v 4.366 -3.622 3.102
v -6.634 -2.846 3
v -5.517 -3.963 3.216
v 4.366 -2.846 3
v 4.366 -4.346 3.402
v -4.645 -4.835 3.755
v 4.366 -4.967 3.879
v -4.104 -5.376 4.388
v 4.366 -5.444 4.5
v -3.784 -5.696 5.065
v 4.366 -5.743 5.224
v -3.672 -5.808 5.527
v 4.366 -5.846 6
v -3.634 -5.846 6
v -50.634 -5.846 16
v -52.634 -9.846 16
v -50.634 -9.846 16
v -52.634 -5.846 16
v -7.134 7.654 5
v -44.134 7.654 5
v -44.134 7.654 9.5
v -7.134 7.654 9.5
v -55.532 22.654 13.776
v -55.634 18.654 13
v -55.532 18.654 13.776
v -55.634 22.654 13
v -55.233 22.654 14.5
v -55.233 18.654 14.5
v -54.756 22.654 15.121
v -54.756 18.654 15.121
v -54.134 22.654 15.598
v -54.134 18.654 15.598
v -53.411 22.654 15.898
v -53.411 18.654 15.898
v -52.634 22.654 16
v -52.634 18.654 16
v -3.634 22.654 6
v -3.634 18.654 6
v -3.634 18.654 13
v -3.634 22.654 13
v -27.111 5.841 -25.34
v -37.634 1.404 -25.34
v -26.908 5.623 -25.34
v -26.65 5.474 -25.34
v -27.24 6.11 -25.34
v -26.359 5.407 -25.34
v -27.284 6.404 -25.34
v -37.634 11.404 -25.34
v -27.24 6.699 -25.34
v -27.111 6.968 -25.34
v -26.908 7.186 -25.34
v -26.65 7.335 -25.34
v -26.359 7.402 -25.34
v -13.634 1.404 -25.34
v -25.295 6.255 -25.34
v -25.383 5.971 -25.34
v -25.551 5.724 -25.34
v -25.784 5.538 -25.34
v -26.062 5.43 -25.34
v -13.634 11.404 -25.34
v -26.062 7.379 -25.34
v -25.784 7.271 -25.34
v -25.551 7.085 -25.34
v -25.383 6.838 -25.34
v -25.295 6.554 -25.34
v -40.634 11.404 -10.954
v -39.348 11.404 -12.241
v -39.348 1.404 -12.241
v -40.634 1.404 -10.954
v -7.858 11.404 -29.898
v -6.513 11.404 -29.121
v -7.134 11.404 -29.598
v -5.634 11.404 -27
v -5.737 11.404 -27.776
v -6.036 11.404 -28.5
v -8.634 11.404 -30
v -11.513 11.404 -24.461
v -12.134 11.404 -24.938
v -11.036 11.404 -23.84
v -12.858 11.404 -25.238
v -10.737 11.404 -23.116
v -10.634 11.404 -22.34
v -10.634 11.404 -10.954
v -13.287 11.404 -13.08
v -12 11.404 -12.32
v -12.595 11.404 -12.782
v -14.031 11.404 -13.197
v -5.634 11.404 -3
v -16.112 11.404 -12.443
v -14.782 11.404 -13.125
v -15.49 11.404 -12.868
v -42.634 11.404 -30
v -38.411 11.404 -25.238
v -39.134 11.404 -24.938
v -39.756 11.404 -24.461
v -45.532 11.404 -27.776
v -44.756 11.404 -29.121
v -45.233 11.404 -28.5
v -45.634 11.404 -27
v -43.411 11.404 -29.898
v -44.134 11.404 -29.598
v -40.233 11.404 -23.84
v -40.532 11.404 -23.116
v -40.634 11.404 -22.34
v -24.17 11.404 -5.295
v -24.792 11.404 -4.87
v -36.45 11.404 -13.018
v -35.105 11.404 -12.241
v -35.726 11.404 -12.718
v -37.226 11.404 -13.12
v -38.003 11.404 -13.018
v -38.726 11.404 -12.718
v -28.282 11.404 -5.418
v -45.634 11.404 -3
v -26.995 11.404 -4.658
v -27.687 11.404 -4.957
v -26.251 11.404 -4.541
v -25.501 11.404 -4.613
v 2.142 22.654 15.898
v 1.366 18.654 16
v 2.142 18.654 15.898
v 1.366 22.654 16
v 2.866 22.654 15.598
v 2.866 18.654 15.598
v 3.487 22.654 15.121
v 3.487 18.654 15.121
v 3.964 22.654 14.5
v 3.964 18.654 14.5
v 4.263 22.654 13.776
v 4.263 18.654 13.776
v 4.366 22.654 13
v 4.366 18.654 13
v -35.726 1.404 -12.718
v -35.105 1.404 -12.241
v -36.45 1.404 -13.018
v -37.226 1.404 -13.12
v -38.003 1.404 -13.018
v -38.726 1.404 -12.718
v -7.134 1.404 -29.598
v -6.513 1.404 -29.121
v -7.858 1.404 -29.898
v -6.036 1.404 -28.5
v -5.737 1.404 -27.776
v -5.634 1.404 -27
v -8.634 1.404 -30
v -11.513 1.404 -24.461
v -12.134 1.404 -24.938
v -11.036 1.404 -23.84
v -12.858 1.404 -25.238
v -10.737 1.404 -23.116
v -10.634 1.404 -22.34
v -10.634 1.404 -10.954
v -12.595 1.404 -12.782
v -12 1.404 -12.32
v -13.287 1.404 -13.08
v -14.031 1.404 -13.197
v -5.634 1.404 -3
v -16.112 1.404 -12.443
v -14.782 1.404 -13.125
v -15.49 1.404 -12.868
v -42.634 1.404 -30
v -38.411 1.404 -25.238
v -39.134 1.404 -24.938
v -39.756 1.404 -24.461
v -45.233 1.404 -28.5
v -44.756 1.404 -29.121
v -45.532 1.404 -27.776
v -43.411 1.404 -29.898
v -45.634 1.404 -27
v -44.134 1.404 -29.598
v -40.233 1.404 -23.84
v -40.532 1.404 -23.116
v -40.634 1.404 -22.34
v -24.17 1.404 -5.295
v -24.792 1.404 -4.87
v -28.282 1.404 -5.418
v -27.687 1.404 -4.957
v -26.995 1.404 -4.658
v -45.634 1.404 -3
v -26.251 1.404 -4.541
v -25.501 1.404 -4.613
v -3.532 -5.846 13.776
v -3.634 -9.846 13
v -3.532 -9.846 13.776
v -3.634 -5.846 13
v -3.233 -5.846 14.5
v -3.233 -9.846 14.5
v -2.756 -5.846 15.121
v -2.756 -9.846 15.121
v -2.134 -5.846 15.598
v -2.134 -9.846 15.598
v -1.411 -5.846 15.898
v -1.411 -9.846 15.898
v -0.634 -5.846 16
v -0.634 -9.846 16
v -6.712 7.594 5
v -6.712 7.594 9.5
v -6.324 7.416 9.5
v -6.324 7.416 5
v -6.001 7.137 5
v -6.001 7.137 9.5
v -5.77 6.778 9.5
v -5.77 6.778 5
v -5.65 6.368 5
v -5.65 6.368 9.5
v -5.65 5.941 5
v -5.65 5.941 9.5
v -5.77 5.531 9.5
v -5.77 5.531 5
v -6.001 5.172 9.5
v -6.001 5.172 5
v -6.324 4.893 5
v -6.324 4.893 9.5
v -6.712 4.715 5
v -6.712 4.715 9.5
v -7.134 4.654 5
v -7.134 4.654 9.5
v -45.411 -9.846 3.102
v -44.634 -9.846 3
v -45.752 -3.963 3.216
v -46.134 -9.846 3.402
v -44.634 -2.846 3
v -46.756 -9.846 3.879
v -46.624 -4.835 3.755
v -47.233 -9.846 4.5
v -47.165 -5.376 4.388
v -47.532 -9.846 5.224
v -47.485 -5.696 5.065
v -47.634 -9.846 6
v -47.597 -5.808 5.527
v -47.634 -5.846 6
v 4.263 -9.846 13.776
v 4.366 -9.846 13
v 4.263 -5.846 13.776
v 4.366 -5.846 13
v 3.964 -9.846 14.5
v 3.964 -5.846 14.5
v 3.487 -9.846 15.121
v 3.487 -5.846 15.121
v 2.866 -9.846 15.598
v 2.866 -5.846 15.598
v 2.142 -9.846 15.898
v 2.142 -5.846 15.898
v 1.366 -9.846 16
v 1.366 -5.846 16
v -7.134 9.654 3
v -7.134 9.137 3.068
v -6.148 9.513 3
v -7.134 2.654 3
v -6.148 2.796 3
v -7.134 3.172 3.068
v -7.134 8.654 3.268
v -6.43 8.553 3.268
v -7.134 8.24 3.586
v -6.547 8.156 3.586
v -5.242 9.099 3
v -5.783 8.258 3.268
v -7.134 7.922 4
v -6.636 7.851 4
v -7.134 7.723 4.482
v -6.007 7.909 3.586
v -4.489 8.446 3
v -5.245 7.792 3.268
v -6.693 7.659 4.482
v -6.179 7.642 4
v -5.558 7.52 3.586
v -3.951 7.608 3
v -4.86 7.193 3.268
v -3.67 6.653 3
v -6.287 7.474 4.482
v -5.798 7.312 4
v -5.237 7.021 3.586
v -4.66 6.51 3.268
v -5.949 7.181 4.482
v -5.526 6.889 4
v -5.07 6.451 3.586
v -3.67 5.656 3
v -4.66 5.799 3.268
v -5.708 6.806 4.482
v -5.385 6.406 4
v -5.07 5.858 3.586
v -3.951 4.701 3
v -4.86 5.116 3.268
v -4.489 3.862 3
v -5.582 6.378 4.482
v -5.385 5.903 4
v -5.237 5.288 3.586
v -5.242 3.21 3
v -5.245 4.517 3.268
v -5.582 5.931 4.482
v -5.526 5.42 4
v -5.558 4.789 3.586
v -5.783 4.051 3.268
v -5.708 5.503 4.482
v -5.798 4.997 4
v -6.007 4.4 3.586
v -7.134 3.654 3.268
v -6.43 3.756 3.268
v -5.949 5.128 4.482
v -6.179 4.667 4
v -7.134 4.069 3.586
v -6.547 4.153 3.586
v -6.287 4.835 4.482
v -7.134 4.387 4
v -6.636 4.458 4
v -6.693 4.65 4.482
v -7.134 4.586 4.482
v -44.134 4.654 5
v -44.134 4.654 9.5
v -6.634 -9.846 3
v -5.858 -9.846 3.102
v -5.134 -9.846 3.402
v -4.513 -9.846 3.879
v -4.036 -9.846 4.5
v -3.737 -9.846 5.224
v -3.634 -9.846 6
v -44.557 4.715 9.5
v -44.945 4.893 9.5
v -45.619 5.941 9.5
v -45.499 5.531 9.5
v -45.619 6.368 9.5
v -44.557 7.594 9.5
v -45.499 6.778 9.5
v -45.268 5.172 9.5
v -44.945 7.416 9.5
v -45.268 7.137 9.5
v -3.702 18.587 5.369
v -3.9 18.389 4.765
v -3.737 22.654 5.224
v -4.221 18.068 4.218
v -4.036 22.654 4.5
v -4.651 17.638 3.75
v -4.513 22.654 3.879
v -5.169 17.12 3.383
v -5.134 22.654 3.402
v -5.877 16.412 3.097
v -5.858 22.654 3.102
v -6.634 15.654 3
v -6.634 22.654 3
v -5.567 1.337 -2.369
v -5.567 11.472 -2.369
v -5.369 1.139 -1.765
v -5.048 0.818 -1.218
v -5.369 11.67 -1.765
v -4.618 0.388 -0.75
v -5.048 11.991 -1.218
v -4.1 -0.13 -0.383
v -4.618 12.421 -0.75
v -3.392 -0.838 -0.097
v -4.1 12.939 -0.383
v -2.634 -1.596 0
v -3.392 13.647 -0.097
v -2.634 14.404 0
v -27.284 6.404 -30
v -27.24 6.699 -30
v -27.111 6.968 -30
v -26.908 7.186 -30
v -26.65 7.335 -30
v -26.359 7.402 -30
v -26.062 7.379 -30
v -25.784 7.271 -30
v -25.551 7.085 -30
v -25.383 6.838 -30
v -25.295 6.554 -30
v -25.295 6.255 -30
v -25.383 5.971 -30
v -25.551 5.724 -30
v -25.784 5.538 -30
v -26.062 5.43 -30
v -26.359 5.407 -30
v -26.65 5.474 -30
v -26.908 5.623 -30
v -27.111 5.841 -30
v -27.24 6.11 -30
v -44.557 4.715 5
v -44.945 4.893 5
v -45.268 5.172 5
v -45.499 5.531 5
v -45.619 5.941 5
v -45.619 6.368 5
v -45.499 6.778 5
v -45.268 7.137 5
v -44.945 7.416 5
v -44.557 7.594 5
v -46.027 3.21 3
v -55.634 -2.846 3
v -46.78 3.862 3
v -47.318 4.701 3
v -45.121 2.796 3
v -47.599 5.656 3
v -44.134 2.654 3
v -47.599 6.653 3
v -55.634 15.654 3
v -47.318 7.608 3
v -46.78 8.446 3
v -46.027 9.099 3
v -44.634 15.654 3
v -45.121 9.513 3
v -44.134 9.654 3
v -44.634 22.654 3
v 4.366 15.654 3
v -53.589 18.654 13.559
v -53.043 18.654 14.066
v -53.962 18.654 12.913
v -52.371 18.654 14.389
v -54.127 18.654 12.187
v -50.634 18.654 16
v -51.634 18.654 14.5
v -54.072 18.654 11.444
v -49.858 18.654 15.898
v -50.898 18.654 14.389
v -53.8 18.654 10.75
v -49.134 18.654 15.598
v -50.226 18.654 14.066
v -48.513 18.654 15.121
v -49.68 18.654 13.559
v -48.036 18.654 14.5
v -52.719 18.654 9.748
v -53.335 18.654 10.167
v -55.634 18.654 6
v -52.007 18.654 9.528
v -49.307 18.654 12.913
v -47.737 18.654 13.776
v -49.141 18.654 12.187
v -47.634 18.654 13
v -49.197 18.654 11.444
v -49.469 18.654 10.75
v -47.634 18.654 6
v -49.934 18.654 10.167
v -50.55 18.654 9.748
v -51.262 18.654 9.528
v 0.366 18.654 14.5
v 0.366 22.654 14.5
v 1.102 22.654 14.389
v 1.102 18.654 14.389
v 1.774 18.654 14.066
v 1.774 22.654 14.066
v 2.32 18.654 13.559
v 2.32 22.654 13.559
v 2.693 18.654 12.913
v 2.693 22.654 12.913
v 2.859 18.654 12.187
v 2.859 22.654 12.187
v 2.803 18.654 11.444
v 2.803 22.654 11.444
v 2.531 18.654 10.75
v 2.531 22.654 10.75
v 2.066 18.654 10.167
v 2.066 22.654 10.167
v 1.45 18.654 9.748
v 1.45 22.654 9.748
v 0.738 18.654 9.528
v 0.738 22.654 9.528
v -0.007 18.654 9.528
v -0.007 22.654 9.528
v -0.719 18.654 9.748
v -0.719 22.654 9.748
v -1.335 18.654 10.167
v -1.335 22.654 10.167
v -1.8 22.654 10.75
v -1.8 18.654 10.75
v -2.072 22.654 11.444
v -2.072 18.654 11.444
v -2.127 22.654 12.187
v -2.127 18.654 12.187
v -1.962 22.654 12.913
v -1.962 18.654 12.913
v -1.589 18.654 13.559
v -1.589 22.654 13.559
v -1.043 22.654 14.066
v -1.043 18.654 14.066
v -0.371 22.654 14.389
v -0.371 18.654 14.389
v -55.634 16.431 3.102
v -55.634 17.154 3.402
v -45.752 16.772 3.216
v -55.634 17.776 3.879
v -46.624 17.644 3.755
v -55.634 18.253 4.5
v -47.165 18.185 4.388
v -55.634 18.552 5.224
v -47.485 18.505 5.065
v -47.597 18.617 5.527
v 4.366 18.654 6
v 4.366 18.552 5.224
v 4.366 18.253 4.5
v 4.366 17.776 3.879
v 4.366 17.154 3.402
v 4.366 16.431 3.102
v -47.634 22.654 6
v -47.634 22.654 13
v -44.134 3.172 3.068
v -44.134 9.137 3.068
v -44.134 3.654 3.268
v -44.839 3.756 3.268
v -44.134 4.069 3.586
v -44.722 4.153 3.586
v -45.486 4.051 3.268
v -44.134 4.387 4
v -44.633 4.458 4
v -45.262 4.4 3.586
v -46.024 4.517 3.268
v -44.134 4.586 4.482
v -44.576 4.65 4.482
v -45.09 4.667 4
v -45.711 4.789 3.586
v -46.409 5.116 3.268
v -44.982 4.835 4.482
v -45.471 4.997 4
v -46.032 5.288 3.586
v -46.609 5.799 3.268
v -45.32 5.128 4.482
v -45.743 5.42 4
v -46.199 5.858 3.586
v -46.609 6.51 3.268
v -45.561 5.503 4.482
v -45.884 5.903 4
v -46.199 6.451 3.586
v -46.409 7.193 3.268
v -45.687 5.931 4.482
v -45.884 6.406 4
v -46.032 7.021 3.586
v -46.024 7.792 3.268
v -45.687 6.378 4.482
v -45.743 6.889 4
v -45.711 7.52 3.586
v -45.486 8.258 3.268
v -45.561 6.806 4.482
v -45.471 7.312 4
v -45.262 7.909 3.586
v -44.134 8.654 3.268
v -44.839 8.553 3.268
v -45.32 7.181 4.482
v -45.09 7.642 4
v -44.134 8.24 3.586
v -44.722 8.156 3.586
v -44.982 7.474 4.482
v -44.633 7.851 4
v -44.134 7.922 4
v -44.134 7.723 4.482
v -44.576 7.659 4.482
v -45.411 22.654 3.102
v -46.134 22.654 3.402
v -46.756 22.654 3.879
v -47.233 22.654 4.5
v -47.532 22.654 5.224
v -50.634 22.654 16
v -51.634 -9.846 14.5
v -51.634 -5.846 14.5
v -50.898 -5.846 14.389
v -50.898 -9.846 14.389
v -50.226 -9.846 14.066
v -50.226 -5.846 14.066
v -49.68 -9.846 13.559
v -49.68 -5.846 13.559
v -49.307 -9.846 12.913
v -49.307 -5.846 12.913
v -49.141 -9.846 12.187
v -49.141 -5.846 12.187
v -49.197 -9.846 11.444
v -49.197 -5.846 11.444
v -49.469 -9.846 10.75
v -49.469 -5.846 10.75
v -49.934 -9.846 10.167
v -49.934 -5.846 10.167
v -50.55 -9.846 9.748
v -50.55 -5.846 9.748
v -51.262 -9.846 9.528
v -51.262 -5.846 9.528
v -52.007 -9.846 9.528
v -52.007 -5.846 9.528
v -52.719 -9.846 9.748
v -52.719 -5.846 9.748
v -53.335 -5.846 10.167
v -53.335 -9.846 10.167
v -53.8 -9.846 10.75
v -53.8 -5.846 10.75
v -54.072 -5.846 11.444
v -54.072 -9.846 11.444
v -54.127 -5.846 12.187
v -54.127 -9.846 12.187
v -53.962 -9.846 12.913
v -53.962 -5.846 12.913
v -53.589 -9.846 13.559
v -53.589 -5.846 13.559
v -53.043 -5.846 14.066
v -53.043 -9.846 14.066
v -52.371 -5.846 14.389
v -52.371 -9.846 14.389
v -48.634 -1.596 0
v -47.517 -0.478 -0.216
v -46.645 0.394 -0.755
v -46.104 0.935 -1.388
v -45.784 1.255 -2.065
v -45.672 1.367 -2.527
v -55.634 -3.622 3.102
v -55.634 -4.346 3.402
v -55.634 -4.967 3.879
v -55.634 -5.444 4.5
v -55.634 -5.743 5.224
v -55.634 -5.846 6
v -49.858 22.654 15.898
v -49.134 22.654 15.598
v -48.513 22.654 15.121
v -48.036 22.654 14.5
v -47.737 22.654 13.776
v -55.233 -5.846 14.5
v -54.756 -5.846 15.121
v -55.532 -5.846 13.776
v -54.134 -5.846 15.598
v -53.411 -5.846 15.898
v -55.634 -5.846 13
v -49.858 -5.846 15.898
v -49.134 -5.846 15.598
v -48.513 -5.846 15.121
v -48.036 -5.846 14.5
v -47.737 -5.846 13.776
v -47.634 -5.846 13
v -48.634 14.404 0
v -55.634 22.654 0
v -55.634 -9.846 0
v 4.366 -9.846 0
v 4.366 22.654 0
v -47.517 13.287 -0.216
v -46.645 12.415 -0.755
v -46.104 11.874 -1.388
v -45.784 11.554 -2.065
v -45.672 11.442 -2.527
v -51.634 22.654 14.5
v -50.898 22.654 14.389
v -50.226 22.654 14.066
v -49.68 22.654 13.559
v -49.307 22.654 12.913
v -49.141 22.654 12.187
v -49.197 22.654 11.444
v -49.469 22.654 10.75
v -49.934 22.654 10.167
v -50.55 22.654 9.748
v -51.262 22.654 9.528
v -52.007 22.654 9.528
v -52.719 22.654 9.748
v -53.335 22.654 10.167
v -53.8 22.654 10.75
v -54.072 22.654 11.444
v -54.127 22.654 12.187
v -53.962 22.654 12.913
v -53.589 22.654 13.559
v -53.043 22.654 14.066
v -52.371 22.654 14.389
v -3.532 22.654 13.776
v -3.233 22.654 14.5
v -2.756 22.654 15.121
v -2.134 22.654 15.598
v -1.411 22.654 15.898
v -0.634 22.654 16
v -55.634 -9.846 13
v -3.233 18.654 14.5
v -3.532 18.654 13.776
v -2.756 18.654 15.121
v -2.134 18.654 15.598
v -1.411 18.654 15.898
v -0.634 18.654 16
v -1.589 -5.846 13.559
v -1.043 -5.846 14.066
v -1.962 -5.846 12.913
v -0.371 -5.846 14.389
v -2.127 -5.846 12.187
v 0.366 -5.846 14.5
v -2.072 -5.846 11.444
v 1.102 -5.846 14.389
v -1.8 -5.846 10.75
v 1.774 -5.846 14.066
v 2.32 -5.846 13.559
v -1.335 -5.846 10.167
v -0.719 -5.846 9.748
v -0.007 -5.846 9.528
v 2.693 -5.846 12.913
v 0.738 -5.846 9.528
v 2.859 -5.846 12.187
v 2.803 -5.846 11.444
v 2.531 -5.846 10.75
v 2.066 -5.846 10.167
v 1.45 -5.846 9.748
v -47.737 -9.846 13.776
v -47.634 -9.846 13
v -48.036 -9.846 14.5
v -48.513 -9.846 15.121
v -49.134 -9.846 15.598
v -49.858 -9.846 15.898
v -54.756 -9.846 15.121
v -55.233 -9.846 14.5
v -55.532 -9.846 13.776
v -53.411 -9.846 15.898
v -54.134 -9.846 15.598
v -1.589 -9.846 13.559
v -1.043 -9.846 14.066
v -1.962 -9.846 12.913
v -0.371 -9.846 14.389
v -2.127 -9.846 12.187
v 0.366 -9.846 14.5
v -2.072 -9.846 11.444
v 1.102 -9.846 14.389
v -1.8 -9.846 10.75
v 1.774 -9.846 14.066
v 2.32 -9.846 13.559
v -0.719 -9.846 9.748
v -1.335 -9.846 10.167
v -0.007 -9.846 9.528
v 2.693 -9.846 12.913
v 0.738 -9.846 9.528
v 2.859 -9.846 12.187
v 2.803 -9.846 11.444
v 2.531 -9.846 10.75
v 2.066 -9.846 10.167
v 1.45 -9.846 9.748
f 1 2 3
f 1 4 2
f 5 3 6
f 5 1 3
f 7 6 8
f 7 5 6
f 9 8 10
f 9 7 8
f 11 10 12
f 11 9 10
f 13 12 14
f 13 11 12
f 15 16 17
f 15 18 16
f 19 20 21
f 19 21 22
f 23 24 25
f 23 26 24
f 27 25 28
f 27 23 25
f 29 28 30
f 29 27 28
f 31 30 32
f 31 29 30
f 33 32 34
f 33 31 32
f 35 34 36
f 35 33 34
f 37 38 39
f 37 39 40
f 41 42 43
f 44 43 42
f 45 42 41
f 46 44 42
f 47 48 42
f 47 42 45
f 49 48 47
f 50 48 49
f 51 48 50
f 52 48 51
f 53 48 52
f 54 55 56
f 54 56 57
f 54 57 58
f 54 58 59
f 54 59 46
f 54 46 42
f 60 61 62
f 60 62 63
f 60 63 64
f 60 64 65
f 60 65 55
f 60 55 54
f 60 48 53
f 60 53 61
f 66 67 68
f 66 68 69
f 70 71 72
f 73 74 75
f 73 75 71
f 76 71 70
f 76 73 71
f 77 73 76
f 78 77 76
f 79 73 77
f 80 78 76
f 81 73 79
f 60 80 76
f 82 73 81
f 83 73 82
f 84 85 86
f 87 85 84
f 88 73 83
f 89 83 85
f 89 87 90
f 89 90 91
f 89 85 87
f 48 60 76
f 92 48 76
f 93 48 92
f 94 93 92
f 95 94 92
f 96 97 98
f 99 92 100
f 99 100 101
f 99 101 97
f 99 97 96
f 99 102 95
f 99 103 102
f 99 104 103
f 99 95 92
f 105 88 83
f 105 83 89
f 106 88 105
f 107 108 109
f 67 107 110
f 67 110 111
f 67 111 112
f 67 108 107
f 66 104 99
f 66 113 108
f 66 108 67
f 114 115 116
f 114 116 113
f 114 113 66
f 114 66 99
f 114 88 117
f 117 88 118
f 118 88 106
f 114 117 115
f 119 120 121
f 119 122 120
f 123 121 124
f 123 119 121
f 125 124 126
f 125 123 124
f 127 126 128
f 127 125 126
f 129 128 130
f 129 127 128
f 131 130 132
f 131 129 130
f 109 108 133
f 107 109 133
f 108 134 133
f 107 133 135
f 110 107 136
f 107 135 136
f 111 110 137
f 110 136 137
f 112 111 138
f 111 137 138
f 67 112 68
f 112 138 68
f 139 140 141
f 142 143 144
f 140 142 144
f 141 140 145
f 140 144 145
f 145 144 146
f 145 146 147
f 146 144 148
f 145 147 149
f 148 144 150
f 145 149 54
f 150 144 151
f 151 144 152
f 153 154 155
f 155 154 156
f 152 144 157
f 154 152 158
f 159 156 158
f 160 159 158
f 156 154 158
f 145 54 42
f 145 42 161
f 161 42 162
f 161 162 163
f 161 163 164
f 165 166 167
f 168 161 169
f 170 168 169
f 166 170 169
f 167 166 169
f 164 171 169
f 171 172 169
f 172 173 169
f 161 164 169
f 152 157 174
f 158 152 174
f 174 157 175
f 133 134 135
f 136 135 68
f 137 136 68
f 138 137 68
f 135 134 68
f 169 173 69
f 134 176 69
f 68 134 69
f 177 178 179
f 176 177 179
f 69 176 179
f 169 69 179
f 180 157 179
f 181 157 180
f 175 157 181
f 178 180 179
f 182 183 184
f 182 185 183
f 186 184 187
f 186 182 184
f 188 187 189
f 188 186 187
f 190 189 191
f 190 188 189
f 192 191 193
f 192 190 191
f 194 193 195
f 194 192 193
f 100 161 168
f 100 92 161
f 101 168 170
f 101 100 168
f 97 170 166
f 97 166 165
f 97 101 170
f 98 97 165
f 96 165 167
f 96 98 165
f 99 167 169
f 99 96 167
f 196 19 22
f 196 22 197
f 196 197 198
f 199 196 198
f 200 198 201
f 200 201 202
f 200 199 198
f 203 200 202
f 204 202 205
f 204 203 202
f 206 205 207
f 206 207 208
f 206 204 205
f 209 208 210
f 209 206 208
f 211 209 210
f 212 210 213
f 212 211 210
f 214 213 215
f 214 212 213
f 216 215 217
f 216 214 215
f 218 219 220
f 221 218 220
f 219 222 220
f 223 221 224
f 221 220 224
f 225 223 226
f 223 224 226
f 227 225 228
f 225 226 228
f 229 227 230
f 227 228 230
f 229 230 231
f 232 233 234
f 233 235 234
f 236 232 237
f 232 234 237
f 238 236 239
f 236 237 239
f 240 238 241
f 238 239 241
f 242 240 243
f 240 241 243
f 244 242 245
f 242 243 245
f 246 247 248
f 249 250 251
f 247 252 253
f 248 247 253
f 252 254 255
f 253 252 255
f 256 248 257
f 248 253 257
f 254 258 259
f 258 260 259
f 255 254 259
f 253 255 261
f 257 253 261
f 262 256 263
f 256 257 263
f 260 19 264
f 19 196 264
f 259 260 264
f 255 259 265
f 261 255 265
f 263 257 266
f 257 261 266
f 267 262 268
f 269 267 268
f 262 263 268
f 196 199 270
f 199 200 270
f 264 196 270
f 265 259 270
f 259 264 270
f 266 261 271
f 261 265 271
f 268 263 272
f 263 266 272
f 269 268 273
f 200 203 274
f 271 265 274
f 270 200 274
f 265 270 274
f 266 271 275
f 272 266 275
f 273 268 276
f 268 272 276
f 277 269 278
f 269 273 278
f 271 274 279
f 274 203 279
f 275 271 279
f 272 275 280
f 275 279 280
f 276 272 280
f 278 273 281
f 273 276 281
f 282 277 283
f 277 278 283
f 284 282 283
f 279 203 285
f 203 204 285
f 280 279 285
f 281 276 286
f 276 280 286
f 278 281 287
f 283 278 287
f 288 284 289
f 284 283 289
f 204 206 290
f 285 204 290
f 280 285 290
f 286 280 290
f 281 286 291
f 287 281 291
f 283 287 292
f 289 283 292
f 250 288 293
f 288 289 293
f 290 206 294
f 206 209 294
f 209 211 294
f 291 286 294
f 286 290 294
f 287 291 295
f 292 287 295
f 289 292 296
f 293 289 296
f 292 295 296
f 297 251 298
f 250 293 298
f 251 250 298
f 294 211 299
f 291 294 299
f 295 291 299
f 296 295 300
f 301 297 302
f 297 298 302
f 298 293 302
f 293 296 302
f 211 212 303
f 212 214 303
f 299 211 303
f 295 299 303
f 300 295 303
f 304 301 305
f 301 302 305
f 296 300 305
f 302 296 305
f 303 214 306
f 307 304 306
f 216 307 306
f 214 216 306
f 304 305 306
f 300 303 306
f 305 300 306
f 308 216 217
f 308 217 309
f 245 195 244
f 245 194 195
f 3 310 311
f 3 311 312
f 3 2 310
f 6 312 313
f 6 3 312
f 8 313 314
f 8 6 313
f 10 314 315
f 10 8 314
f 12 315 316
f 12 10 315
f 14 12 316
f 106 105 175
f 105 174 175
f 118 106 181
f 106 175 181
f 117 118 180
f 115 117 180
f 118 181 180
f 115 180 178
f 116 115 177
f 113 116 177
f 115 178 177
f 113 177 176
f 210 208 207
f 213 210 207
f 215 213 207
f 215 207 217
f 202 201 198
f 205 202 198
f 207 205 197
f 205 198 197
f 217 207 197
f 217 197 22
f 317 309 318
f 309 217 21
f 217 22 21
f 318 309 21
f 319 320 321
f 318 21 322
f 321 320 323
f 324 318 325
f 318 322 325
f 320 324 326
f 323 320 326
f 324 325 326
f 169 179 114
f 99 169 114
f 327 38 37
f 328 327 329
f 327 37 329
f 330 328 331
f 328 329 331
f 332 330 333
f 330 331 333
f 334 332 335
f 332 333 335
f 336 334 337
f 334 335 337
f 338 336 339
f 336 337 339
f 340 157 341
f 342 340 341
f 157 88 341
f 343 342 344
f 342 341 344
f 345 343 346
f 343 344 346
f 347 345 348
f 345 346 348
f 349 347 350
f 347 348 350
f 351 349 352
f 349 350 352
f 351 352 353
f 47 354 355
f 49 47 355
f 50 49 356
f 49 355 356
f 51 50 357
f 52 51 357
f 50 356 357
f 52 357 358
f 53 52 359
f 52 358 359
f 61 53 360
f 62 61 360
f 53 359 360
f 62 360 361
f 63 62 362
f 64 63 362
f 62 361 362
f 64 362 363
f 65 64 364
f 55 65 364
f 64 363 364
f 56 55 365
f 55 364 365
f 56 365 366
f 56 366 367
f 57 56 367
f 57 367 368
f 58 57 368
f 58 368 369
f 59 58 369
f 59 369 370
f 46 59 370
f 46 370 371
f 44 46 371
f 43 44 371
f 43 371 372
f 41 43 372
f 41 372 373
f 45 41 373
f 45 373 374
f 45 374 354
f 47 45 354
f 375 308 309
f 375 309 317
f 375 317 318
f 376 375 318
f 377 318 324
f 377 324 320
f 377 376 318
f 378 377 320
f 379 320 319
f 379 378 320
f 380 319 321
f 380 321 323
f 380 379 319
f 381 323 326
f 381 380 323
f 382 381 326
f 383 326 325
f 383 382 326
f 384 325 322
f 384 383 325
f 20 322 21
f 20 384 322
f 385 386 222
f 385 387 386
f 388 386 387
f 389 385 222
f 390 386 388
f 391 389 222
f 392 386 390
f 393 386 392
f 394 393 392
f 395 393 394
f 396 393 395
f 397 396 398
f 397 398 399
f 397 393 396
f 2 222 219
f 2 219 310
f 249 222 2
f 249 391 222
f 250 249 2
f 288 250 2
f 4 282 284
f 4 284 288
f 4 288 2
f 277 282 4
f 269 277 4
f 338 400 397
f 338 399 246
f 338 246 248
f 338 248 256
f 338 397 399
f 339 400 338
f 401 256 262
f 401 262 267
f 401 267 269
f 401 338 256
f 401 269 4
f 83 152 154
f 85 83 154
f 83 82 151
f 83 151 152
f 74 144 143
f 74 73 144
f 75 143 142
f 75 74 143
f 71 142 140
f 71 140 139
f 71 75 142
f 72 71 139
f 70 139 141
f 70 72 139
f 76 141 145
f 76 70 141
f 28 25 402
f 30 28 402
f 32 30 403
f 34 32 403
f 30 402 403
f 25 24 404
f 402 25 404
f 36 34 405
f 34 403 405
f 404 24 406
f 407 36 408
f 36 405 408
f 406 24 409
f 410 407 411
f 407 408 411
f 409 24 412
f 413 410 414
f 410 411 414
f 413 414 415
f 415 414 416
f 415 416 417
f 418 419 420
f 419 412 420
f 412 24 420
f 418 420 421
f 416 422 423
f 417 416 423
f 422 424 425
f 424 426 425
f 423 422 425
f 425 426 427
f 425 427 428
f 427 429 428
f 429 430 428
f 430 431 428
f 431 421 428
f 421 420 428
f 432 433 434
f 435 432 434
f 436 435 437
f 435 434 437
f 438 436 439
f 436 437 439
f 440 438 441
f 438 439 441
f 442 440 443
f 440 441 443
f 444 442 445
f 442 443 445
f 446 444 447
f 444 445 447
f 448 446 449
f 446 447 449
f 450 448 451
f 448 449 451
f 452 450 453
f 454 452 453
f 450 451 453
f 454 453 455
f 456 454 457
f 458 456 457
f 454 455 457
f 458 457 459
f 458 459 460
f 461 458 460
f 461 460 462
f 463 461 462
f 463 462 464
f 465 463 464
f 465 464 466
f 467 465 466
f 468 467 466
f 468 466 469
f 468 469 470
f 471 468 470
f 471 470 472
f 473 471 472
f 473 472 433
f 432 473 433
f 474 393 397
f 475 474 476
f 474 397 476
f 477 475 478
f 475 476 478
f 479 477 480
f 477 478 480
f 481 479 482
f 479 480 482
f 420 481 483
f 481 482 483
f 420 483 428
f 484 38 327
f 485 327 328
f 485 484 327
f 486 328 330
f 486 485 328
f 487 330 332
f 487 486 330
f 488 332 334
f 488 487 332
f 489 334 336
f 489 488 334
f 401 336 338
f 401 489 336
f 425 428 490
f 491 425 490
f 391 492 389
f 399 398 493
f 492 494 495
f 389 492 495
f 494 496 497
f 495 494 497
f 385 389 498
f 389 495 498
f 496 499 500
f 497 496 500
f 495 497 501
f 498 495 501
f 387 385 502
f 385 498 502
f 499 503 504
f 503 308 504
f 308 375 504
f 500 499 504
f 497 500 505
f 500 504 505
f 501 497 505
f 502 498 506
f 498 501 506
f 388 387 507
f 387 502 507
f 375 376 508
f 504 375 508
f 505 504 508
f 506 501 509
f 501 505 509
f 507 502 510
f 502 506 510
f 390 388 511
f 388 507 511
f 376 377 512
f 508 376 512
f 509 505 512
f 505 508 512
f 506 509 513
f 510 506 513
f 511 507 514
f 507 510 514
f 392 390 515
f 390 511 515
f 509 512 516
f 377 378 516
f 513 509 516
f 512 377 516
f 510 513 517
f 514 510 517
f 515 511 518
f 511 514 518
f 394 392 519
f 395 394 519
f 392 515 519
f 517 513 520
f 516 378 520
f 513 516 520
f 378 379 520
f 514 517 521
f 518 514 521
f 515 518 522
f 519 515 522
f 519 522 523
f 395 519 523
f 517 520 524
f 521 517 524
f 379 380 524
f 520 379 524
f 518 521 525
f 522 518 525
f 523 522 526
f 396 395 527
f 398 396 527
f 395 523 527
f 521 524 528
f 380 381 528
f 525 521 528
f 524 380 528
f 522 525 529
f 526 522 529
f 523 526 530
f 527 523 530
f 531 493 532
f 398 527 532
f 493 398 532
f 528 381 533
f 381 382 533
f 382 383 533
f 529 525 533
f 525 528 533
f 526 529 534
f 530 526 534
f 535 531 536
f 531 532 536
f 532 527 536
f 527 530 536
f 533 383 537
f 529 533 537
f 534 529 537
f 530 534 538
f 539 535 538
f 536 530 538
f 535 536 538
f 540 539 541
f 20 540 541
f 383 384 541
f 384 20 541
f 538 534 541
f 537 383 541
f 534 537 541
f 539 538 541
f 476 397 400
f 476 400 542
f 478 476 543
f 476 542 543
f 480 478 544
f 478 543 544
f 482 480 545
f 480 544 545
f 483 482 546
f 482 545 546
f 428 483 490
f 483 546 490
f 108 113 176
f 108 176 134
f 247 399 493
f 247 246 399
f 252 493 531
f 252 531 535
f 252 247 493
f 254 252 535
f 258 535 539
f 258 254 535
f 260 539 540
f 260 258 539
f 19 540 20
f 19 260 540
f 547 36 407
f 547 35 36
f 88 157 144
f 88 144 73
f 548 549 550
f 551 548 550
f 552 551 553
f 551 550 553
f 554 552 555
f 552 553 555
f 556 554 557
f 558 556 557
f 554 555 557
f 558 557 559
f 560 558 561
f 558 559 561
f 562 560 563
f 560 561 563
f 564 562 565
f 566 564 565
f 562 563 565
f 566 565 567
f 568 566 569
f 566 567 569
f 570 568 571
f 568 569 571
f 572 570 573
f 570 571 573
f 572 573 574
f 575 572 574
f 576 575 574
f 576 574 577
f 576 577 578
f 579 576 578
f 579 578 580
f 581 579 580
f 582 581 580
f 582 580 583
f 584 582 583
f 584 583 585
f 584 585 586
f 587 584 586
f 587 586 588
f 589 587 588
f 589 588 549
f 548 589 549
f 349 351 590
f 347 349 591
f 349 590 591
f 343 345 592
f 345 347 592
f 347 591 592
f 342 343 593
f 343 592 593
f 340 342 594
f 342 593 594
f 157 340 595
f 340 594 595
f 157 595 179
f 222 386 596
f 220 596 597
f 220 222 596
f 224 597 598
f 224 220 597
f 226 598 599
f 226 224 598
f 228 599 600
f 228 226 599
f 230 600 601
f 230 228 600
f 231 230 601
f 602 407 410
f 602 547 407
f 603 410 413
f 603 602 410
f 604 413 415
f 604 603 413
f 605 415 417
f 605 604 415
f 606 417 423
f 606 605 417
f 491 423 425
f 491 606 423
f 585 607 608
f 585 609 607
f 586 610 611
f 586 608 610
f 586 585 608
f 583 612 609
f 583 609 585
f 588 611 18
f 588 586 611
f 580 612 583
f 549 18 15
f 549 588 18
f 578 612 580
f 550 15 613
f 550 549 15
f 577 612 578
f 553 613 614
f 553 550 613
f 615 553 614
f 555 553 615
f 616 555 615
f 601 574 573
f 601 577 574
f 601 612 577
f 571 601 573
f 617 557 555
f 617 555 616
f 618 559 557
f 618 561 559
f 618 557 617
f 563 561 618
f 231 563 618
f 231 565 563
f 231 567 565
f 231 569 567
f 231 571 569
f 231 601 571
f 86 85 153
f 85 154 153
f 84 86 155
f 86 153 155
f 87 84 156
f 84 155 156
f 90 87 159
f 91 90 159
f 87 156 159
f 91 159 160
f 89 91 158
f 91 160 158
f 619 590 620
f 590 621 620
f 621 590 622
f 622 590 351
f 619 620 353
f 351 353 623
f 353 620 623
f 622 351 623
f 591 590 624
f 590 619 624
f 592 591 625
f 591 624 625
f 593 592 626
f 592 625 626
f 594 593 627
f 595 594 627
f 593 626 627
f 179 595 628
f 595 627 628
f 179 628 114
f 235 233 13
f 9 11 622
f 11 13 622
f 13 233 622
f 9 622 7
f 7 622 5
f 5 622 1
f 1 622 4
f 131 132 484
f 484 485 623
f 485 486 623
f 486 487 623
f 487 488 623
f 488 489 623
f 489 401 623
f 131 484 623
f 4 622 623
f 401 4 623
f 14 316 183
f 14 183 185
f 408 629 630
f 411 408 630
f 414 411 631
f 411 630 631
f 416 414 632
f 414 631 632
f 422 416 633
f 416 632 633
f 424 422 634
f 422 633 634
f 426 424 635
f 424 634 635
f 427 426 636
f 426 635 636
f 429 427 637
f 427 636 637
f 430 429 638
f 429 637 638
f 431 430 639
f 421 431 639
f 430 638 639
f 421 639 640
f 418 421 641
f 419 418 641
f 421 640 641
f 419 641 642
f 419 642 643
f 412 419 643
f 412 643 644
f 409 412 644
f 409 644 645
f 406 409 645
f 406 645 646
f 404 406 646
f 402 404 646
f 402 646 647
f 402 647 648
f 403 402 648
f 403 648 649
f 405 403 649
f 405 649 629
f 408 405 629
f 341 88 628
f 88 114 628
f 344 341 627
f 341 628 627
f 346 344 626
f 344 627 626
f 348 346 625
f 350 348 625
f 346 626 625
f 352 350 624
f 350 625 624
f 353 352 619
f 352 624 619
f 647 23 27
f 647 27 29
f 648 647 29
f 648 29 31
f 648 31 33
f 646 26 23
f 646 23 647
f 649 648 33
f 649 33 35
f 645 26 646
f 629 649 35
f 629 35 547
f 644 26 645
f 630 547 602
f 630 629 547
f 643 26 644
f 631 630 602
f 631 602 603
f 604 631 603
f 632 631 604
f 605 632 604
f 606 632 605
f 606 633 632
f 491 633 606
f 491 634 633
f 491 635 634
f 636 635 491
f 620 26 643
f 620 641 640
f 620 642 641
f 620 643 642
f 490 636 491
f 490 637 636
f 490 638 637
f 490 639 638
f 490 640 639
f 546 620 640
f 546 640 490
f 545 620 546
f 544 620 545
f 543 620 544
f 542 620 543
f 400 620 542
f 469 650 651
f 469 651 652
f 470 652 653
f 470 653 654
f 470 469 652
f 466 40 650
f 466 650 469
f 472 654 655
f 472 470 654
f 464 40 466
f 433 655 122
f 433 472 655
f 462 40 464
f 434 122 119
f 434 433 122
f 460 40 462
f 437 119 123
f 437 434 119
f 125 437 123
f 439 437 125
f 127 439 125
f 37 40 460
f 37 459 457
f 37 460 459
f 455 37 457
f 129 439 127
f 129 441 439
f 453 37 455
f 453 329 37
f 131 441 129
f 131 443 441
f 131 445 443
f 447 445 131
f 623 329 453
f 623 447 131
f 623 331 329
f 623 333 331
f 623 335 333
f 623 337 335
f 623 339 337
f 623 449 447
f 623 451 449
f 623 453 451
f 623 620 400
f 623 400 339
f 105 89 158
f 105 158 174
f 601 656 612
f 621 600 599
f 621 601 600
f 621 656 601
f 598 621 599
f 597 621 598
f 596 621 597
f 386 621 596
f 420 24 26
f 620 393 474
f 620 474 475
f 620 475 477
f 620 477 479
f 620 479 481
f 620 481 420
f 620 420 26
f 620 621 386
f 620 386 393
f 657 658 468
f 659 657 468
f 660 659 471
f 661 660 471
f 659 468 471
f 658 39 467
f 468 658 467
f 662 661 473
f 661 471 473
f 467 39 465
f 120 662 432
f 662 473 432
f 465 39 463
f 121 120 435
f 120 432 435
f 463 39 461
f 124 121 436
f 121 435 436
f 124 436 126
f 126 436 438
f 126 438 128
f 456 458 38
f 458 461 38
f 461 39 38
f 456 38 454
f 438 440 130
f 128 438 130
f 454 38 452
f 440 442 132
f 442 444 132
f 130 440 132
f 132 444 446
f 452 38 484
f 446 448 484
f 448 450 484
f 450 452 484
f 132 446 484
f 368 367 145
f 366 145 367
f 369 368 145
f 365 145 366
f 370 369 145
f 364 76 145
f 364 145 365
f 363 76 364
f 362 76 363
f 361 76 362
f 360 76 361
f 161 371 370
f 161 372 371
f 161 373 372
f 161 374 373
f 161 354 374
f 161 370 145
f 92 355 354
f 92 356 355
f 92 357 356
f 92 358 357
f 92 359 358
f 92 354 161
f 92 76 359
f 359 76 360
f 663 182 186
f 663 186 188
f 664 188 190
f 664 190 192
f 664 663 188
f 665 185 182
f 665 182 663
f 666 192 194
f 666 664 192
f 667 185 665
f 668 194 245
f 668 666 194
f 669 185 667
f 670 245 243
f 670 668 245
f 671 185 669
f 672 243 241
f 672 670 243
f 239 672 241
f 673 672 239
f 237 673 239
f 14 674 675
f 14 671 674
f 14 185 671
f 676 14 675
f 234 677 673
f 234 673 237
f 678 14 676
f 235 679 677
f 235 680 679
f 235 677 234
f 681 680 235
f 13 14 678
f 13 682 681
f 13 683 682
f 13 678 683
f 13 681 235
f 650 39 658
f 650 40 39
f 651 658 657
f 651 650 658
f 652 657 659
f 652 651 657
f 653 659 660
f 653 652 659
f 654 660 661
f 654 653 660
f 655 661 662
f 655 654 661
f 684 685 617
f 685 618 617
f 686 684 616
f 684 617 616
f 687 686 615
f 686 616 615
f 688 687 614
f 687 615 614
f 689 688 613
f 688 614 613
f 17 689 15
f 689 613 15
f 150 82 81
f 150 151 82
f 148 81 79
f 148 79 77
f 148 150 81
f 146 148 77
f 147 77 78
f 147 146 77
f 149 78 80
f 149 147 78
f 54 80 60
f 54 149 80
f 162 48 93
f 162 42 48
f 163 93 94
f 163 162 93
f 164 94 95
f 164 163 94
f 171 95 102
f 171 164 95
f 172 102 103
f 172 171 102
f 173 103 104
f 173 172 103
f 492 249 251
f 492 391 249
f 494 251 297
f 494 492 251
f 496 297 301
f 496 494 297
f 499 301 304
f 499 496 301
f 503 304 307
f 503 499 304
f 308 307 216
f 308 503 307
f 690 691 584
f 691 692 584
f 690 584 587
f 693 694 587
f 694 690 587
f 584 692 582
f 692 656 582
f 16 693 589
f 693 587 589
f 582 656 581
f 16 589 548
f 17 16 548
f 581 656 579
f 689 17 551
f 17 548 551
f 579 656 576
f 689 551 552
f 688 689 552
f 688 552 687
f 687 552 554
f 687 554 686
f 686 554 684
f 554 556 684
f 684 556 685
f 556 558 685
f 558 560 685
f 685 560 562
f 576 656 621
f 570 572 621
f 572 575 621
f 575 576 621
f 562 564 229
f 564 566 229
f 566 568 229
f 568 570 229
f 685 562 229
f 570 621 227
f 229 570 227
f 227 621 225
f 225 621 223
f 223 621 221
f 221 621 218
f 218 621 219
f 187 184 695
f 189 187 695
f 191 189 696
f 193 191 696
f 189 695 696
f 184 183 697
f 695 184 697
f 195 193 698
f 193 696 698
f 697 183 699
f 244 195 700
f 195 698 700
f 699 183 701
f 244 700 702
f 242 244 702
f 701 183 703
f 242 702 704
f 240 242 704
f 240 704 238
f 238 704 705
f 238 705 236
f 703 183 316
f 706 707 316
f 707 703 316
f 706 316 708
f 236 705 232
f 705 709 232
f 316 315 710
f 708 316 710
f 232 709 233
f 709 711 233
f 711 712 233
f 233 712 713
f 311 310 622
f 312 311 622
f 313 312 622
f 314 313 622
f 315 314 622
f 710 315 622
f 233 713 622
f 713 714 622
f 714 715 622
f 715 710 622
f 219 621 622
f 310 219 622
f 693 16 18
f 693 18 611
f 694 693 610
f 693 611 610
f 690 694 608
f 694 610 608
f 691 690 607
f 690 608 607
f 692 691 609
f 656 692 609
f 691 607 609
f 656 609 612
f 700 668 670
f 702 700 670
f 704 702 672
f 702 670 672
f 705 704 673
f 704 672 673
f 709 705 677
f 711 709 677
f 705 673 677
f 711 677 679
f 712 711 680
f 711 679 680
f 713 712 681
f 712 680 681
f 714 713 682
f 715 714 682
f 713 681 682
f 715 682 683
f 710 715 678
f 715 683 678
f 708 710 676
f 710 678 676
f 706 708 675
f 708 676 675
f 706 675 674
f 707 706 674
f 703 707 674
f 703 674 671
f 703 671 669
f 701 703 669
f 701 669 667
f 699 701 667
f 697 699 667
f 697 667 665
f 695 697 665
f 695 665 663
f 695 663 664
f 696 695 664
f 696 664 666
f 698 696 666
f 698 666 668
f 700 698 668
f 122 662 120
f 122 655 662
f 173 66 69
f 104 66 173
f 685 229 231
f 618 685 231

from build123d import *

# Parameters (mm, degrees)
SKETCH2_W           = 60
SKETCH2_H           = 32.5
BOSS_EXTRUDE1_DEPTH = 3
SKETCH3_W           = 8
SKETCH3_H           = 4
BOSS_EXTRUDE2_DEPTH = 13
FILLET1_R           = 3
SKETCH4_R           = 2.5
CUT_EXTRUDE1_DEPTH  = 13
SKETCH5_R           = 2.5
CUT_EXTRUDE2_DEPTH  = 13
FILLET2_R           = 3
BOSS_EXTRUDE3_DEPTH = 6.5
FILLET3_R           = 2
SKETCH7_W           = 40
SKETCH7_H           = 10
BOSS_EXTRUDE4_DEPTH = 30
CUT_EXTRUDE3_DEPTH  = 30
FILLET5_R           = 3
SKETCH9_R           = 1
CUT_EXTRUDE4_DEPTH  = 5
FILLET6_R           = 3
FILLET7_R           = 3
FILLET8_R           = 3


with BuildPart() as part:
    # Sketch2 → Boss-Extrude1 (new body)
    with BuildSketch(Plane.XY):
        with Locations((-25.634473236, 6.404480792)):
            Rectangle(SKETCH2_W, SKETCH2_H)
    extrude(amount=BOSS_EXTRUDE1_DEPTH)

    # Sketch3 → Boss-Extrude2 (add)
    with BuildSketch(Plane.XY.offset(3)):
        with Locations((0.365526764, 20.654480792)):
            Rectangle(SKETCH3_W, SKETCH3_H)
        with Locations((0.365526764, -7.845519208)):
            Rectangle(SKETCH3_W, SKETCH3_H)
        with Locations((-51.634473236, 20.654480792)):
            Rectangle(SKETCH3_W, SKETCH3_H)
        with Locations((-51.634473236, -7.845519208)):
            Rectangle(SKETCH3_W, SKETCH3_H)
    extrude(amount=BOSS_EXTRUDE2_DEPTH)

    # Fillet1
    fillet1_edges = [part.edges().sort_by_distance(p)[0] for p in [
        (-55.634473236, 20.654480792, 16),
        (-47.634473236, 20.654480792, 16),
        (-55.634473236, -7.845519208, 16),
        (-47.634473236, -7.845519208, 16),
        (-3.634473236, -7.845519208, 16),
        (4.365526764, -7.845519208, 16),
        (-3.634473236, 20.654480792, 16),
        (4.365526764, 20.654480792, 16),
    ]]
    fillet(fillet1_edges, radius=FILLET1_R)

    # Sketch4 → Cut-Extrude1 (cut)
    with BuildSketch(Plane(origin=(0, 22.654480792, 0), x_dir=(1, 0, 0), z_dir=(0, 1, 0))):
        with Locations((0.365526764, -12)):
            Circle(SKETCH4_R)
        with Locations((-51.634473236, -12)):
            Circle(SKETCH4_R)
    extrude(amount=-CUT_EXTRUDE1_DEPTH, mode=Mode.SUBTRACT)

    # Sketch5 → Cut-Extrude2 (cut)
    with BuildSketch(Plane(origin=(0, -5.845519208, 0), x_dir=(1, 0, 0), z_dir=(0, 1, 0))):
        with Locations((-51.634473236, -12)):
            Circle(SKETCH5_R)
        with Locations((0.365526764, -12)):
            Circle(SKETCH5_R)
    extrude(amount=-CUT_EXTRUDE2_DEPTH, mode=Mode.SUBTRACT)

    # Fillet2
    fillet2_edges = [part.edges().sort_by_distance(p)[0] for p in [
        (-51.634473236, 18.654480792, 3),
        (-47.634473236, 20.654480792, 3),
        (-47.634473236, -7.845519208, 3),
        (-51.634473236, -5.845519208, 3),
        (-3.634473236, -7.845519208, 3),
        (0.365526764, -5.845519208, 3),
        (0.365526764, 18.654480792, 3),
        (-3.634473236, 20.654480792, 3),
    ]]
    fillet(fillet2_edges, radius=FILLET2_R)

    # Sketch6 → Boss-Extrude3 (add)
    with BuildSketch(Plane.XY.offset(3)):
        with BuildLine():
            Line((-44.134473236, 7.654480792), (-7.134473236, 7.654480792))
            ThreePointArc((-7.134473236, 7.654480792), (-5.634473236, 6.154480792), (-7.134473236, 4.654480792))
            Line((-7.134473236, 4.654480792), (-44.134473236, 4.654480792))
            ThreePointArc((-44.134473236, 4.654480792), (-45.634473236, 6.154480792), (-44.134473236, 7.654480792))
        make_face()
    extrude(amount=BOSS_EXTRUDE3_DEPTH)

    # Fillet3
    fillet3_edges = [part.edges().sort_by_distance(p)[0] for p in [
        (-5.634473236, 6.154480792, 3),
        (-25.634473236, 4.654480792, 3),
        (-45.634473236, 6.154480792, 3),
        (-25.634473236, 7.654480792, 3),
    ]]
    fillet(fillet3_edges, radius=FILLET3_R)

    # Sketch7 → Boss-Extrude4 (add)
    with BuildSketch(Plane(origin=(0, 0, 0), x_dir=(-1, 0, 0), z_dir=(0, 0, -1))):
        with Locations((25.634473236, 6.404480792)):
            Rectangle(SKETCH7_W, SKETCH7_H)
    extrude(amount=BOSS_EXTRUDE4_DEPTH)

    # Sketch8 → Cut-Extrude3 (cut)
    with BuildSketch(Plane(origin=(0, 11.404480792, 0), x_dir=(1, 0, 0), z_dir=(0, 1, 0))):
        Polygon((-10.634473236, 10.954417446), (-13.99795844, 14.31790265), (-26.284293259, 3.42037636), (-37.226403791, 14.362486892), (-40.634473236, 10.954417446), (-40.634473236, 25.339784932), (-10.634473236, 25.339784932), align=None)
    extrude(amount=-CUT_EXTRUDE3_DEPTH, mode=Mode.SUBTRACT)

    # Fillet5
    fillet5_edges = [part.edges().sort_by_distance(p)[0] for p in [
        (-10.634473236, 6.404480792, -25.339784932),
        (-40.634473236, 6.404480792, -25.339784932),
    ]]
    fillet(fillet5_edges, radius=FILLET5_R)

    # Sketch9 → Cut-Extrude4 (cut)
    with BuildSketch(Plane(origin=(0, 0, -30), x_dir=(-1, 0, 0), z_dir=(0, 0, -1))):
        with Locations((26.284293259, 6.404480792)):
            Circle(SKETCH9_R)
    extrude(amount=-CUT_EXTRUDE4_DEPTH, mode=Mode.SUBTRACT)

    # Fillet6
    fillet6_edges = [part.edges().sort_by_distance(p)[0] for p in [
        (-37.226403791, 6.404480792, -14.362486892),
        (-13.99795844, 6.404480792, -14.31790265),
        (-26.284293259, 6.404480792, -3.42037636),
    ]]
    fillet(fillet6_edges, radius=FILLET6_R)

    # Fillet7
    fillet7_edges = [part.edges().sort_by_distance(p)[0] for p in [
        (-5.634473236, 6.404480792, 0),
        (-25.634473236, 1.404480792, 0),
        (-45.634473236, 6.404480792, 0),
        (-25.634473236, 11.404480792, 0),
    ]]
    fillet(fillet7_edges, radius=FILLET7_R)

    # Fillet8
    fillet8_edges = [part.edges().sort_by_distance(p)[0] for p in [
        (-5.634473236, 6.404480792, -30),
        (-45.634473236, 6.404480792, -30),
    ]]
    fillet(fillet8_edges, radius=FILLET8_R)


solid = part.part
